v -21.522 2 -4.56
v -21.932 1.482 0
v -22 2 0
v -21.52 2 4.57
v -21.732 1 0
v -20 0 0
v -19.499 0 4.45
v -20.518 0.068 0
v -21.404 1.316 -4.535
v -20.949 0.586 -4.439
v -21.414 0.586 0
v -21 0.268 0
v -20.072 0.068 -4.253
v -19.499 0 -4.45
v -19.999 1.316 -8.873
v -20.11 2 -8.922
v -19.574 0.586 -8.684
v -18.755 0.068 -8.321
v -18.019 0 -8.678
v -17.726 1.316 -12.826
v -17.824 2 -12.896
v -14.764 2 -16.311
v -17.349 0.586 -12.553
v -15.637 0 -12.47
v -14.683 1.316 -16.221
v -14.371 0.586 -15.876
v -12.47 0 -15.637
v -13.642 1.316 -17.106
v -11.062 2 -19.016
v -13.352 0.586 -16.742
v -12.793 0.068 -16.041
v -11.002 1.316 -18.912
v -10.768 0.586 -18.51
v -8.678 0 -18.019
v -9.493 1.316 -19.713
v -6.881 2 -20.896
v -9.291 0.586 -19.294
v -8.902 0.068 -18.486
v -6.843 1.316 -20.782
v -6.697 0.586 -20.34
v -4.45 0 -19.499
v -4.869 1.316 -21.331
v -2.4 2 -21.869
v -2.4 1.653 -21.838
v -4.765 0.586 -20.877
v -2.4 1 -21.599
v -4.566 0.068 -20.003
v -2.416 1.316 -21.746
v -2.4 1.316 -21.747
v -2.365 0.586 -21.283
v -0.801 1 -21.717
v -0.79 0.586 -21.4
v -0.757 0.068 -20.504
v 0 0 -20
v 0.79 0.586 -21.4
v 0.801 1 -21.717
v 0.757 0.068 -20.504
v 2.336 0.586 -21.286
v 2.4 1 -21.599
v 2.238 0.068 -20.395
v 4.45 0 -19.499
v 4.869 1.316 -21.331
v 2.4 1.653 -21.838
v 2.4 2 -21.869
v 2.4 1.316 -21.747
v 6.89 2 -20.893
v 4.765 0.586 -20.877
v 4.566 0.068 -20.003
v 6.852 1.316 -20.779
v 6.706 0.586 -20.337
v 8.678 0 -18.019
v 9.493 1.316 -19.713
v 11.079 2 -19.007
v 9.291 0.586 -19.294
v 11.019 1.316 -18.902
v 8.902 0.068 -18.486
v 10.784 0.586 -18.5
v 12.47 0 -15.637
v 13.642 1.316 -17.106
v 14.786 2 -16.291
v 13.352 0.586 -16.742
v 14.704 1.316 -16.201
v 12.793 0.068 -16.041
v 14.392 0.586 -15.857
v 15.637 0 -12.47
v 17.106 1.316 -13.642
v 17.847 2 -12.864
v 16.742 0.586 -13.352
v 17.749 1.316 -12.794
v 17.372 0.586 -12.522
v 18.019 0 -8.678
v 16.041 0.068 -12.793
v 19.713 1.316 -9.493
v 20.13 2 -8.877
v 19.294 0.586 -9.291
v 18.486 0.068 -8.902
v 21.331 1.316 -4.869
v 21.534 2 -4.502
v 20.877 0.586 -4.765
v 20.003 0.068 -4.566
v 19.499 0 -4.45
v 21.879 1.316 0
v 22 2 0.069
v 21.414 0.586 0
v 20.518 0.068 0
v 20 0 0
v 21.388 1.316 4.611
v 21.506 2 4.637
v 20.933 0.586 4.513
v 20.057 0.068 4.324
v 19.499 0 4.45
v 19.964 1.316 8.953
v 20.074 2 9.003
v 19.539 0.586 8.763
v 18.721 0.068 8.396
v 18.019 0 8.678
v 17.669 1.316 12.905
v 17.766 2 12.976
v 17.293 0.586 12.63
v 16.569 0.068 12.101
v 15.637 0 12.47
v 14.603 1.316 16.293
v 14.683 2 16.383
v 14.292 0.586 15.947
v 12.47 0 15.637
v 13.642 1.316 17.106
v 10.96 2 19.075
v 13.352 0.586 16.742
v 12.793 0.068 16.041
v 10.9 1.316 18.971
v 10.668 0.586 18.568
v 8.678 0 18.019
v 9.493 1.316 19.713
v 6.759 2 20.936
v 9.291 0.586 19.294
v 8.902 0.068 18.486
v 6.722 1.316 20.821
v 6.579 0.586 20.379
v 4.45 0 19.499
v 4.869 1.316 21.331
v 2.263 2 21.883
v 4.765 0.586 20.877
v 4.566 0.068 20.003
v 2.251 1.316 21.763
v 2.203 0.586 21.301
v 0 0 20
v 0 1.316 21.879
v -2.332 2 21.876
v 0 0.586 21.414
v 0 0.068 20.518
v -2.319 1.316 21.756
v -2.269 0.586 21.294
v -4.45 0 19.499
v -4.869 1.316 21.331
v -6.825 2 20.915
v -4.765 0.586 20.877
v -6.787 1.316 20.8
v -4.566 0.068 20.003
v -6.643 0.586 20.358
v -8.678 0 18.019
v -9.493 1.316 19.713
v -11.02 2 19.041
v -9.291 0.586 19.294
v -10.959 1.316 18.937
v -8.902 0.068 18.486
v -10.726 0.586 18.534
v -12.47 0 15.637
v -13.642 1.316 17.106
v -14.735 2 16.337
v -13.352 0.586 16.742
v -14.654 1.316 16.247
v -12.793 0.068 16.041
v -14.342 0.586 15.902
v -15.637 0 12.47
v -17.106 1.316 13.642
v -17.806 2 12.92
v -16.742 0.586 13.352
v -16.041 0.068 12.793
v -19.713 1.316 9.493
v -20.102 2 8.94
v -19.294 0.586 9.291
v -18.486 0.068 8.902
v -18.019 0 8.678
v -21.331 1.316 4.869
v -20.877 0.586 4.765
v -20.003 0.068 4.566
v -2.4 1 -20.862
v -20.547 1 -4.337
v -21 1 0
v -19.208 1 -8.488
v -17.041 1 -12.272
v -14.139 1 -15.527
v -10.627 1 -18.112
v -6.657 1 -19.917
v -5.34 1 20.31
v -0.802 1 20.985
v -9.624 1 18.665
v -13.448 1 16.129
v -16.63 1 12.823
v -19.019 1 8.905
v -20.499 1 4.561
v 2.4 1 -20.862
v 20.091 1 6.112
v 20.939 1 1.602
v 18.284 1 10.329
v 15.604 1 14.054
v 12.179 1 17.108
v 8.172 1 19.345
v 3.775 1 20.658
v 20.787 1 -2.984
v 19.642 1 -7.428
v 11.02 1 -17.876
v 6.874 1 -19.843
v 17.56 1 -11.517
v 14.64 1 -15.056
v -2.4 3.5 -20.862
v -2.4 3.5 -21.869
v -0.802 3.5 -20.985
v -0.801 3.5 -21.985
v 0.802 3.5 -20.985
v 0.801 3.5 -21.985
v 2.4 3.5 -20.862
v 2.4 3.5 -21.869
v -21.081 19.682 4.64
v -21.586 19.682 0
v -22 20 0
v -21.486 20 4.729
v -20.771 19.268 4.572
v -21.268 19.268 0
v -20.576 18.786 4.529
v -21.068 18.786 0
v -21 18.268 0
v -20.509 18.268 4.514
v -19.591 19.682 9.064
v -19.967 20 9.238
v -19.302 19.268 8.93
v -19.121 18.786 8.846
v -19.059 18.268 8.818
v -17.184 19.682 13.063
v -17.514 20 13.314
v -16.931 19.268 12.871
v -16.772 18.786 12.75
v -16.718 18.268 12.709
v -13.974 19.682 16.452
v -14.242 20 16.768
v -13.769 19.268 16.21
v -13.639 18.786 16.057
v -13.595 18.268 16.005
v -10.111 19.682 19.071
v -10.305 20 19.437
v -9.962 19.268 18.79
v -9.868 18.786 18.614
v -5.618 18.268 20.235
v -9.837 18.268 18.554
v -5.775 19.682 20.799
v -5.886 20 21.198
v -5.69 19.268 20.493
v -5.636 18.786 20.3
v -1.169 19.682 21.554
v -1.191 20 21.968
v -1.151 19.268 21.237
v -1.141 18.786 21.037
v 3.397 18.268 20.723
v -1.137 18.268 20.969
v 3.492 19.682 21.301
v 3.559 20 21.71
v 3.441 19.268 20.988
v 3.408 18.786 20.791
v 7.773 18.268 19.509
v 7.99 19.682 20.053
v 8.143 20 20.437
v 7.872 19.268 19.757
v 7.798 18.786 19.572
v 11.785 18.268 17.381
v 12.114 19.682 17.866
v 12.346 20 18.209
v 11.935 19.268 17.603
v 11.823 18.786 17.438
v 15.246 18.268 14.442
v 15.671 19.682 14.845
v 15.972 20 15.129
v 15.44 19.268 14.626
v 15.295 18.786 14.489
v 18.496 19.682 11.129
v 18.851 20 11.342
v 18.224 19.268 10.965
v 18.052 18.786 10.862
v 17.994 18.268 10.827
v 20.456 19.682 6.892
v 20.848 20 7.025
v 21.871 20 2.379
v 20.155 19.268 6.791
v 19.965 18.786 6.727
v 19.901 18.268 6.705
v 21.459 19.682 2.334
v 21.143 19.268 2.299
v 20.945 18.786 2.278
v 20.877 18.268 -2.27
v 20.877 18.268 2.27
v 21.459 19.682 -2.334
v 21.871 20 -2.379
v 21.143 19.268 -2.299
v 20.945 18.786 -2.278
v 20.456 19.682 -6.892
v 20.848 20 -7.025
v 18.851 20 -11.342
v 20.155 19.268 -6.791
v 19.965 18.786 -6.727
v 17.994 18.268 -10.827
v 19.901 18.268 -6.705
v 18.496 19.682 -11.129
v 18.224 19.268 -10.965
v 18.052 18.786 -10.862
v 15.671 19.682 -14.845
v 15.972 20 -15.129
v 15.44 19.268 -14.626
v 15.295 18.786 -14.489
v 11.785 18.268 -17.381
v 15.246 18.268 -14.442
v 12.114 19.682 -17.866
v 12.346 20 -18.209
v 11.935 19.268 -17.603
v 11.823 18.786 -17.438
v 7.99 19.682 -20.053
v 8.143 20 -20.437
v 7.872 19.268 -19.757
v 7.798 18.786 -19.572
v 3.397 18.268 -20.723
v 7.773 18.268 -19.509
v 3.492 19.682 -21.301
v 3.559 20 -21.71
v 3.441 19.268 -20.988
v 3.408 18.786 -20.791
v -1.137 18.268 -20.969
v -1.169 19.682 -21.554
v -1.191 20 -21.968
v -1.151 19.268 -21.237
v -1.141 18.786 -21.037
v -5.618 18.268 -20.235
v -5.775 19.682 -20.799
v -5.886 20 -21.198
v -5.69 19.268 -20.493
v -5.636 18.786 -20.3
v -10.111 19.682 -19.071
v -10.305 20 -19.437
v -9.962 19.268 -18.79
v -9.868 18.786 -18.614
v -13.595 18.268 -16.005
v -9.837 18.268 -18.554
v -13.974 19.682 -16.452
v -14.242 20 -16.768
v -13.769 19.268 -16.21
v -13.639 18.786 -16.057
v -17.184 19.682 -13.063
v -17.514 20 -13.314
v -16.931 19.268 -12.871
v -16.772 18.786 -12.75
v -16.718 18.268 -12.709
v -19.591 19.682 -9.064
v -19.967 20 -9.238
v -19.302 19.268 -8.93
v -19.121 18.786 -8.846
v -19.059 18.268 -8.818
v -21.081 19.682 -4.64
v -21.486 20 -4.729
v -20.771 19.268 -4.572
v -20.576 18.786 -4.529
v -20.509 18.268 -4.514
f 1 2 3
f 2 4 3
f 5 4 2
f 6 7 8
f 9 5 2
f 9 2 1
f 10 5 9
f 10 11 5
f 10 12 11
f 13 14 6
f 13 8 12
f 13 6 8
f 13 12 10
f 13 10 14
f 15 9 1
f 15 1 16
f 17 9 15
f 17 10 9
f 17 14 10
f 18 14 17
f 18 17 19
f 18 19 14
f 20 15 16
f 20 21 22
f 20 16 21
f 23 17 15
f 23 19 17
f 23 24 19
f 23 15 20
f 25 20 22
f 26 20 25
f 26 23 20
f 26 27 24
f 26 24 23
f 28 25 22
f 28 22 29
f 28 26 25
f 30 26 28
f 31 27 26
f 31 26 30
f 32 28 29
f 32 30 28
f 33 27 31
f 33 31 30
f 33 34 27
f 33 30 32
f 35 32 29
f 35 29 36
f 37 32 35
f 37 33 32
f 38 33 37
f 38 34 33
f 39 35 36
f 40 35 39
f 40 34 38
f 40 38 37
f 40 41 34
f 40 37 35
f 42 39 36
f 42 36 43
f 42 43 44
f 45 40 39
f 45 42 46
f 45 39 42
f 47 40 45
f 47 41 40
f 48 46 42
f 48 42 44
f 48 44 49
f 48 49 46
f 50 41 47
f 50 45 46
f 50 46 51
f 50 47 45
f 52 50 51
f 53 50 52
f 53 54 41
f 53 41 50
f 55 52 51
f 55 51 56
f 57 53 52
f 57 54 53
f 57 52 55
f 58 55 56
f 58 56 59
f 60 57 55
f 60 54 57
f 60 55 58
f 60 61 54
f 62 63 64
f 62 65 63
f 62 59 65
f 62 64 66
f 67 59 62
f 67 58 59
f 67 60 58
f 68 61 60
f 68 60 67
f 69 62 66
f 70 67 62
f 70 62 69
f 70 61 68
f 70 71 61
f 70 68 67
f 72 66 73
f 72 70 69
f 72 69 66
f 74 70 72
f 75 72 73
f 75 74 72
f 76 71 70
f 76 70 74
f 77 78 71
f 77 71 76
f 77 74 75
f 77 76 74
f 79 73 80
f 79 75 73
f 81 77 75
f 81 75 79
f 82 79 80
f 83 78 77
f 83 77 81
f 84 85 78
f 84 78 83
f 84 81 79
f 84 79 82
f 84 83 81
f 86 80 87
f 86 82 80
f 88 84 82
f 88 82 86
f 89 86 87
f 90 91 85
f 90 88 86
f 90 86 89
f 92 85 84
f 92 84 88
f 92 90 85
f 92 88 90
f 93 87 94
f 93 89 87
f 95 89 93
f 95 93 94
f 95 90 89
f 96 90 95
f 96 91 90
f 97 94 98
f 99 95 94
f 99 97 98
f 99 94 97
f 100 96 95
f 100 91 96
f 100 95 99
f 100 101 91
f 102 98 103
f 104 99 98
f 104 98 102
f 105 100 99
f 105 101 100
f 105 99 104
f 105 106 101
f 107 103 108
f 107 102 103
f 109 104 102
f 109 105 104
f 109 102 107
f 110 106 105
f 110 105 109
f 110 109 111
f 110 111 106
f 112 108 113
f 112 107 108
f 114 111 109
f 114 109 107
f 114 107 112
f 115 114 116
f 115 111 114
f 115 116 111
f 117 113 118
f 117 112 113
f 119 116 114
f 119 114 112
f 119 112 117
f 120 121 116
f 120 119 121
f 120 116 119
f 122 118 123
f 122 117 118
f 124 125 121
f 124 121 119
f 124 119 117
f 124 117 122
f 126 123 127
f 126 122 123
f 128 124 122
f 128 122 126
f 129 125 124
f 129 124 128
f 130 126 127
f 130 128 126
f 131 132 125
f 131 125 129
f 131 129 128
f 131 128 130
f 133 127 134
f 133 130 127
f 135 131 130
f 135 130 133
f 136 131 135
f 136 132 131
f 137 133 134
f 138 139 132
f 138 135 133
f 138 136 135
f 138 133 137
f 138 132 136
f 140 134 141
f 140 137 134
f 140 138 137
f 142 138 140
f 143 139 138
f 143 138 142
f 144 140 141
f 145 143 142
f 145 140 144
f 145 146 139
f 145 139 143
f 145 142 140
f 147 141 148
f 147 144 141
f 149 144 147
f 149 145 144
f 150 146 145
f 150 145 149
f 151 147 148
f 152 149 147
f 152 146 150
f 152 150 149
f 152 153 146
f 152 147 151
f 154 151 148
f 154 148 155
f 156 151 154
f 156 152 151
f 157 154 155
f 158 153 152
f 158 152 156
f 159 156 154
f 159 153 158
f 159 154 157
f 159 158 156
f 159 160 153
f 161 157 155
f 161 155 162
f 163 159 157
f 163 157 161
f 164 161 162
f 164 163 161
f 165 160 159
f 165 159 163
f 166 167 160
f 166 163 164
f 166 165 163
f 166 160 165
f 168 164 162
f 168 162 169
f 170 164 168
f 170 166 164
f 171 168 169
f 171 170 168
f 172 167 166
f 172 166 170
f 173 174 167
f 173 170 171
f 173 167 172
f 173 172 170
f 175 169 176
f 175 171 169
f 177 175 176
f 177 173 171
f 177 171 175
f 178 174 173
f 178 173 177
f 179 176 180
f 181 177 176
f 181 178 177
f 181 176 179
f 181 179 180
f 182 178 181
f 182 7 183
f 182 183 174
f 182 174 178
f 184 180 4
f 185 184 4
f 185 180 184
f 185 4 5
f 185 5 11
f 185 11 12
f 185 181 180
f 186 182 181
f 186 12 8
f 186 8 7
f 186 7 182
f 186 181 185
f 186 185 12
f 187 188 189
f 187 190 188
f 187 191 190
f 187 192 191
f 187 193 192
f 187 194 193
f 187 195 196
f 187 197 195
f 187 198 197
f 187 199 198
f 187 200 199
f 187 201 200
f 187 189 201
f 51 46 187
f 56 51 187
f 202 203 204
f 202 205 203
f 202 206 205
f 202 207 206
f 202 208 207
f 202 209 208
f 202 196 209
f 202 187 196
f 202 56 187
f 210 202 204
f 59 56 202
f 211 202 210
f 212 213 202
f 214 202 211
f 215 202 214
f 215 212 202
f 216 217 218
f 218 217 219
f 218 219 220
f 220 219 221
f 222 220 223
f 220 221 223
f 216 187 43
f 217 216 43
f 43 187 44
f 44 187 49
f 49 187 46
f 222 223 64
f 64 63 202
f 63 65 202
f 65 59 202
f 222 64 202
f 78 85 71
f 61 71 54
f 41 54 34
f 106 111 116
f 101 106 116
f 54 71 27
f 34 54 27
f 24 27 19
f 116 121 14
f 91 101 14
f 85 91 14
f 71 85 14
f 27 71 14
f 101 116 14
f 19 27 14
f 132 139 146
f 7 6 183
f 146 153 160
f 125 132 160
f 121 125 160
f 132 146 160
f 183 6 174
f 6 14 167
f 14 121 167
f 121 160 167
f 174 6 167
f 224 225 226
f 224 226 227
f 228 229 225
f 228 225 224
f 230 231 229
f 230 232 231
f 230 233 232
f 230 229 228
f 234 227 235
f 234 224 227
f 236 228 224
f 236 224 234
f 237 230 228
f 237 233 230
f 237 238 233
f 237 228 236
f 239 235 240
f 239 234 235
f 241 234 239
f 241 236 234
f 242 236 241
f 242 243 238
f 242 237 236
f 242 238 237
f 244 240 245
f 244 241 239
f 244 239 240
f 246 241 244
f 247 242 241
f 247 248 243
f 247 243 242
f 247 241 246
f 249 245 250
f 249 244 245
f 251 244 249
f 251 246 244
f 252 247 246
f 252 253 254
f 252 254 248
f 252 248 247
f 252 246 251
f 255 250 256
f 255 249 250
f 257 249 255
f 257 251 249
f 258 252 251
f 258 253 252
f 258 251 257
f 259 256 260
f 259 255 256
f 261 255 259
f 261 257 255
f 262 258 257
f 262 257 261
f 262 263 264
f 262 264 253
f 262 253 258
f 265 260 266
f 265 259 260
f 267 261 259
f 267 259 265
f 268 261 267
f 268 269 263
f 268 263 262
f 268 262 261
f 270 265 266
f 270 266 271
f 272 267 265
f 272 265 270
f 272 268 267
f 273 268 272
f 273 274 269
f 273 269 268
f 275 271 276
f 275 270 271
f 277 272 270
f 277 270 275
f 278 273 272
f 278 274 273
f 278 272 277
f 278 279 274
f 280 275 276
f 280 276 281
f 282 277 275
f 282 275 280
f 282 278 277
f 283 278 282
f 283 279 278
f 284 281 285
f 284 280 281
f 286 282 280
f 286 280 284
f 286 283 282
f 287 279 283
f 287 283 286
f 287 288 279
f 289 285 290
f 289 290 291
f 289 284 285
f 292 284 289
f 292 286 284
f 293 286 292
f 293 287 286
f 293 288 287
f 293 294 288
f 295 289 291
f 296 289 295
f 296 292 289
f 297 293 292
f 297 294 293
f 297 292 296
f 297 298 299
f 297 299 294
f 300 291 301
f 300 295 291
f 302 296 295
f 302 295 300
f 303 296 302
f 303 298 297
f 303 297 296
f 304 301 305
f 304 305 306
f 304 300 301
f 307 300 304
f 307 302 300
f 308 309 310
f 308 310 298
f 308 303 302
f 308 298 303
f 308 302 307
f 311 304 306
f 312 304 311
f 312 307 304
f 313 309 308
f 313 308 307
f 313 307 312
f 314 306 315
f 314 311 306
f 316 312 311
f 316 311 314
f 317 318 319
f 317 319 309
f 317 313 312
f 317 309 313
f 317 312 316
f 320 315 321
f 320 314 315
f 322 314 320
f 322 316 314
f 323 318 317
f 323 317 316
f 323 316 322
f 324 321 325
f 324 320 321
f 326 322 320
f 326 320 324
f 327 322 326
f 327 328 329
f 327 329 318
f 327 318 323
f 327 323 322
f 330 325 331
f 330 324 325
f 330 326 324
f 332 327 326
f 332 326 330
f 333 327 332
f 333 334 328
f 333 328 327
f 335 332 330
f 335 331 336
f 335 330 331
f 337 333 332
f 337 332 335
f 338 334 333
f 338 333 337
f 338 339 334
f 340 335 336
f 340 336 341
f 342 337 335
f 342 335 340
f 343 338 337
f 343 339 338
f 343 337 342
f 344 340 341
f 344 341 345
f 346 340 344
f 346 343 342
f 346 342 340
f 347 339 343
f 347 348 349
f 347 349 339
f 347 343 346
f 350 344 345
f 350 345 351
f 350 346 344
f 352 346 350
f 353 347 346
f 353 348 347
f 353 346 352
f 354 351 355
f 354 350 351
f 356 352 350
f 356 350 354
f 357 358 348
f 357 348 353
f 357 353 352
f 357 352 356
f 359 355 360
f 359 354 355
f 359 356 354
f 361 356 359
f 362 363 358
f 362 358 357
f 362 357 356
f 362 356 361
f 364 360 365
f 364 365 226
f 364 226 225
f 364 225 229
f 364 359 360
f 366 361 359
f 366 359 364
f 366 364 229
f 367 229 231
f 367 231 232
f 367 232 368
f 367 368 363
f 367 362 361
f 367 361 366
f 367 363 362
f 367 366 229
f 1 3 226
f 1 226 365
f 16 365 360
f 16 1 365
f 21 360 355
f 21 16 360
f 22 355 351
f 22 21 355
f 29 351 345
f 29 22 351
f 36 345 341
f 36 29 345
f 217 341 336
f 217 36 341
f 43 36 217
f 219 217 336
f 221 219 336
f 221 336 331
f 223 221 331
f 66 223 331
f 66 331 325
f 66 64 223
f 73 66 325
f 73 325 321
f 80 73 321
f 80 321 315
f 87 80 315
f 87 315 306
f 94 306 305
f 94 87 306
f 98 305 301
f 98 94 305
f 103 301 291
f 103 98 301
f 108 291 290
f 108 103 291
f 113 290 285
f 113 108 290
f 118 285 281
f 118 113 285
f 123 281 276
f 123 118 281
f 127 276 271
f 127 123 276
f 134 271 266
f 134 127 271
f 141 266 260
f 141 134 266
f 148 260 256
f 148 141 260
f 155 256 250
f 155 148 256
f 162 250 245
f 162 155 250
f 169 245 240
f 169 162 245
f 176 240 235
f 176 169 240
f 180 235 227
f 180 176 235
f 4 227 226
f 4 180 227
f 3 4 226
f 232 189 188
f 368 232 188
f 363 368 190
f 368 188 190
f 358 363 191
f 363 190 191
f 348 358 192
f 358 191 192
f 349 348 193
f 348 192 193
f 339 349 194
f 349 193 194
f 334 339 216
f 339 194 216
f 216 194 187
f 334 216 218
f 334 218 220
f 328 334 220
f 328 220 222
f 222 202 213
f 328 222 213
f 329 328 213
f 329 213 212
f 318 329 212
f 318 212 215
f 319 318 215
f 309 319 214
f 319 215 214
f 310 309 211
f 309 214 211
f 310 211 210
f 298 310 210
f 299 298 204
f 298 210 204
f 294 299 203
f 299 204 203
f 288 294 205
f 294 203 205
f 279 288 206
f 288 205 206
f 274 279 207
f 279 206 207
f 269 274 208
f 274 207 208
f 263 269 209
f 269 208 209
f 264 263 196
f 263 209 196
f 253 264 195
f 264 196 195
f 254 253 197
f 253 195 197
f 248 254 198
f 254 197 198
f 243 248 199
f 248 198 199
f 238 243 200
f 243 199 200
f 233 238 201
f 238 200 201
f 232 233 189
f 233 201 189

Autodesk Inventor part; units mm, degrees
ref_plane "YZ Plane" through (0, 0, 0) normal (1, 0, 0) x (0, 1, 0)
ref_plane "XZ Plane" through (0, 0, 0) normal (0, 1, 0) x (-1, 0, 0)
ref_plane "XY Plane" through (0, 0, 0) normal (0, 0, 1) x (1, 0, 0)
sketch "Boceto1" plane through (0, 0, 0) normal (0, 1, 0) x (-1, 0, 0)
  circle A0 centre (0, 0) radius 22
  dimension "d0" = 44
extrude "Extrusión1" add sketch "Boceto1" along normal blind 20
shell "Vaciado1" thickness 1 removed faces 1 at (6.4933, 20, -3.408)
sketch "Boceto3" plane through (0, 1, 0) normal (0, 1, 0) x (1, 0, 0)
  circle A0 centre (0, 0) radius 21 projected
  line L0 (2.4, 19.75) -> (-2.4, 19.75)
  line L1 (-2.4, 19.75) -> (-2.4, 22.25)
  line L2 (-2.4, 22.25) -> (2.4, 22.25)
  line L3 (2.4, 22.25) -> (2.4, 19.75)
  line L4 (2.4, 19.75) -> (-2.4, 22.25) construction
  line L5 (-2.4, 19.75) -> (2.4, 22.25) construction
  point P0 (0, 21)
  dimension "d4" = 4.8
  dimension "d5" = 2.5
extrude "Extrusión2" cut sketch "Boceto3" along normal blind 2.5 contours L3 L0 L1 A0 | A0 L1 L2 L3 picked at (-0.2672, 20.1616)
fillet "Empalme1" radius 2 2 edges at (22, 0, 0) (21, 20, 0)
properties part number "Tapa motor775"
